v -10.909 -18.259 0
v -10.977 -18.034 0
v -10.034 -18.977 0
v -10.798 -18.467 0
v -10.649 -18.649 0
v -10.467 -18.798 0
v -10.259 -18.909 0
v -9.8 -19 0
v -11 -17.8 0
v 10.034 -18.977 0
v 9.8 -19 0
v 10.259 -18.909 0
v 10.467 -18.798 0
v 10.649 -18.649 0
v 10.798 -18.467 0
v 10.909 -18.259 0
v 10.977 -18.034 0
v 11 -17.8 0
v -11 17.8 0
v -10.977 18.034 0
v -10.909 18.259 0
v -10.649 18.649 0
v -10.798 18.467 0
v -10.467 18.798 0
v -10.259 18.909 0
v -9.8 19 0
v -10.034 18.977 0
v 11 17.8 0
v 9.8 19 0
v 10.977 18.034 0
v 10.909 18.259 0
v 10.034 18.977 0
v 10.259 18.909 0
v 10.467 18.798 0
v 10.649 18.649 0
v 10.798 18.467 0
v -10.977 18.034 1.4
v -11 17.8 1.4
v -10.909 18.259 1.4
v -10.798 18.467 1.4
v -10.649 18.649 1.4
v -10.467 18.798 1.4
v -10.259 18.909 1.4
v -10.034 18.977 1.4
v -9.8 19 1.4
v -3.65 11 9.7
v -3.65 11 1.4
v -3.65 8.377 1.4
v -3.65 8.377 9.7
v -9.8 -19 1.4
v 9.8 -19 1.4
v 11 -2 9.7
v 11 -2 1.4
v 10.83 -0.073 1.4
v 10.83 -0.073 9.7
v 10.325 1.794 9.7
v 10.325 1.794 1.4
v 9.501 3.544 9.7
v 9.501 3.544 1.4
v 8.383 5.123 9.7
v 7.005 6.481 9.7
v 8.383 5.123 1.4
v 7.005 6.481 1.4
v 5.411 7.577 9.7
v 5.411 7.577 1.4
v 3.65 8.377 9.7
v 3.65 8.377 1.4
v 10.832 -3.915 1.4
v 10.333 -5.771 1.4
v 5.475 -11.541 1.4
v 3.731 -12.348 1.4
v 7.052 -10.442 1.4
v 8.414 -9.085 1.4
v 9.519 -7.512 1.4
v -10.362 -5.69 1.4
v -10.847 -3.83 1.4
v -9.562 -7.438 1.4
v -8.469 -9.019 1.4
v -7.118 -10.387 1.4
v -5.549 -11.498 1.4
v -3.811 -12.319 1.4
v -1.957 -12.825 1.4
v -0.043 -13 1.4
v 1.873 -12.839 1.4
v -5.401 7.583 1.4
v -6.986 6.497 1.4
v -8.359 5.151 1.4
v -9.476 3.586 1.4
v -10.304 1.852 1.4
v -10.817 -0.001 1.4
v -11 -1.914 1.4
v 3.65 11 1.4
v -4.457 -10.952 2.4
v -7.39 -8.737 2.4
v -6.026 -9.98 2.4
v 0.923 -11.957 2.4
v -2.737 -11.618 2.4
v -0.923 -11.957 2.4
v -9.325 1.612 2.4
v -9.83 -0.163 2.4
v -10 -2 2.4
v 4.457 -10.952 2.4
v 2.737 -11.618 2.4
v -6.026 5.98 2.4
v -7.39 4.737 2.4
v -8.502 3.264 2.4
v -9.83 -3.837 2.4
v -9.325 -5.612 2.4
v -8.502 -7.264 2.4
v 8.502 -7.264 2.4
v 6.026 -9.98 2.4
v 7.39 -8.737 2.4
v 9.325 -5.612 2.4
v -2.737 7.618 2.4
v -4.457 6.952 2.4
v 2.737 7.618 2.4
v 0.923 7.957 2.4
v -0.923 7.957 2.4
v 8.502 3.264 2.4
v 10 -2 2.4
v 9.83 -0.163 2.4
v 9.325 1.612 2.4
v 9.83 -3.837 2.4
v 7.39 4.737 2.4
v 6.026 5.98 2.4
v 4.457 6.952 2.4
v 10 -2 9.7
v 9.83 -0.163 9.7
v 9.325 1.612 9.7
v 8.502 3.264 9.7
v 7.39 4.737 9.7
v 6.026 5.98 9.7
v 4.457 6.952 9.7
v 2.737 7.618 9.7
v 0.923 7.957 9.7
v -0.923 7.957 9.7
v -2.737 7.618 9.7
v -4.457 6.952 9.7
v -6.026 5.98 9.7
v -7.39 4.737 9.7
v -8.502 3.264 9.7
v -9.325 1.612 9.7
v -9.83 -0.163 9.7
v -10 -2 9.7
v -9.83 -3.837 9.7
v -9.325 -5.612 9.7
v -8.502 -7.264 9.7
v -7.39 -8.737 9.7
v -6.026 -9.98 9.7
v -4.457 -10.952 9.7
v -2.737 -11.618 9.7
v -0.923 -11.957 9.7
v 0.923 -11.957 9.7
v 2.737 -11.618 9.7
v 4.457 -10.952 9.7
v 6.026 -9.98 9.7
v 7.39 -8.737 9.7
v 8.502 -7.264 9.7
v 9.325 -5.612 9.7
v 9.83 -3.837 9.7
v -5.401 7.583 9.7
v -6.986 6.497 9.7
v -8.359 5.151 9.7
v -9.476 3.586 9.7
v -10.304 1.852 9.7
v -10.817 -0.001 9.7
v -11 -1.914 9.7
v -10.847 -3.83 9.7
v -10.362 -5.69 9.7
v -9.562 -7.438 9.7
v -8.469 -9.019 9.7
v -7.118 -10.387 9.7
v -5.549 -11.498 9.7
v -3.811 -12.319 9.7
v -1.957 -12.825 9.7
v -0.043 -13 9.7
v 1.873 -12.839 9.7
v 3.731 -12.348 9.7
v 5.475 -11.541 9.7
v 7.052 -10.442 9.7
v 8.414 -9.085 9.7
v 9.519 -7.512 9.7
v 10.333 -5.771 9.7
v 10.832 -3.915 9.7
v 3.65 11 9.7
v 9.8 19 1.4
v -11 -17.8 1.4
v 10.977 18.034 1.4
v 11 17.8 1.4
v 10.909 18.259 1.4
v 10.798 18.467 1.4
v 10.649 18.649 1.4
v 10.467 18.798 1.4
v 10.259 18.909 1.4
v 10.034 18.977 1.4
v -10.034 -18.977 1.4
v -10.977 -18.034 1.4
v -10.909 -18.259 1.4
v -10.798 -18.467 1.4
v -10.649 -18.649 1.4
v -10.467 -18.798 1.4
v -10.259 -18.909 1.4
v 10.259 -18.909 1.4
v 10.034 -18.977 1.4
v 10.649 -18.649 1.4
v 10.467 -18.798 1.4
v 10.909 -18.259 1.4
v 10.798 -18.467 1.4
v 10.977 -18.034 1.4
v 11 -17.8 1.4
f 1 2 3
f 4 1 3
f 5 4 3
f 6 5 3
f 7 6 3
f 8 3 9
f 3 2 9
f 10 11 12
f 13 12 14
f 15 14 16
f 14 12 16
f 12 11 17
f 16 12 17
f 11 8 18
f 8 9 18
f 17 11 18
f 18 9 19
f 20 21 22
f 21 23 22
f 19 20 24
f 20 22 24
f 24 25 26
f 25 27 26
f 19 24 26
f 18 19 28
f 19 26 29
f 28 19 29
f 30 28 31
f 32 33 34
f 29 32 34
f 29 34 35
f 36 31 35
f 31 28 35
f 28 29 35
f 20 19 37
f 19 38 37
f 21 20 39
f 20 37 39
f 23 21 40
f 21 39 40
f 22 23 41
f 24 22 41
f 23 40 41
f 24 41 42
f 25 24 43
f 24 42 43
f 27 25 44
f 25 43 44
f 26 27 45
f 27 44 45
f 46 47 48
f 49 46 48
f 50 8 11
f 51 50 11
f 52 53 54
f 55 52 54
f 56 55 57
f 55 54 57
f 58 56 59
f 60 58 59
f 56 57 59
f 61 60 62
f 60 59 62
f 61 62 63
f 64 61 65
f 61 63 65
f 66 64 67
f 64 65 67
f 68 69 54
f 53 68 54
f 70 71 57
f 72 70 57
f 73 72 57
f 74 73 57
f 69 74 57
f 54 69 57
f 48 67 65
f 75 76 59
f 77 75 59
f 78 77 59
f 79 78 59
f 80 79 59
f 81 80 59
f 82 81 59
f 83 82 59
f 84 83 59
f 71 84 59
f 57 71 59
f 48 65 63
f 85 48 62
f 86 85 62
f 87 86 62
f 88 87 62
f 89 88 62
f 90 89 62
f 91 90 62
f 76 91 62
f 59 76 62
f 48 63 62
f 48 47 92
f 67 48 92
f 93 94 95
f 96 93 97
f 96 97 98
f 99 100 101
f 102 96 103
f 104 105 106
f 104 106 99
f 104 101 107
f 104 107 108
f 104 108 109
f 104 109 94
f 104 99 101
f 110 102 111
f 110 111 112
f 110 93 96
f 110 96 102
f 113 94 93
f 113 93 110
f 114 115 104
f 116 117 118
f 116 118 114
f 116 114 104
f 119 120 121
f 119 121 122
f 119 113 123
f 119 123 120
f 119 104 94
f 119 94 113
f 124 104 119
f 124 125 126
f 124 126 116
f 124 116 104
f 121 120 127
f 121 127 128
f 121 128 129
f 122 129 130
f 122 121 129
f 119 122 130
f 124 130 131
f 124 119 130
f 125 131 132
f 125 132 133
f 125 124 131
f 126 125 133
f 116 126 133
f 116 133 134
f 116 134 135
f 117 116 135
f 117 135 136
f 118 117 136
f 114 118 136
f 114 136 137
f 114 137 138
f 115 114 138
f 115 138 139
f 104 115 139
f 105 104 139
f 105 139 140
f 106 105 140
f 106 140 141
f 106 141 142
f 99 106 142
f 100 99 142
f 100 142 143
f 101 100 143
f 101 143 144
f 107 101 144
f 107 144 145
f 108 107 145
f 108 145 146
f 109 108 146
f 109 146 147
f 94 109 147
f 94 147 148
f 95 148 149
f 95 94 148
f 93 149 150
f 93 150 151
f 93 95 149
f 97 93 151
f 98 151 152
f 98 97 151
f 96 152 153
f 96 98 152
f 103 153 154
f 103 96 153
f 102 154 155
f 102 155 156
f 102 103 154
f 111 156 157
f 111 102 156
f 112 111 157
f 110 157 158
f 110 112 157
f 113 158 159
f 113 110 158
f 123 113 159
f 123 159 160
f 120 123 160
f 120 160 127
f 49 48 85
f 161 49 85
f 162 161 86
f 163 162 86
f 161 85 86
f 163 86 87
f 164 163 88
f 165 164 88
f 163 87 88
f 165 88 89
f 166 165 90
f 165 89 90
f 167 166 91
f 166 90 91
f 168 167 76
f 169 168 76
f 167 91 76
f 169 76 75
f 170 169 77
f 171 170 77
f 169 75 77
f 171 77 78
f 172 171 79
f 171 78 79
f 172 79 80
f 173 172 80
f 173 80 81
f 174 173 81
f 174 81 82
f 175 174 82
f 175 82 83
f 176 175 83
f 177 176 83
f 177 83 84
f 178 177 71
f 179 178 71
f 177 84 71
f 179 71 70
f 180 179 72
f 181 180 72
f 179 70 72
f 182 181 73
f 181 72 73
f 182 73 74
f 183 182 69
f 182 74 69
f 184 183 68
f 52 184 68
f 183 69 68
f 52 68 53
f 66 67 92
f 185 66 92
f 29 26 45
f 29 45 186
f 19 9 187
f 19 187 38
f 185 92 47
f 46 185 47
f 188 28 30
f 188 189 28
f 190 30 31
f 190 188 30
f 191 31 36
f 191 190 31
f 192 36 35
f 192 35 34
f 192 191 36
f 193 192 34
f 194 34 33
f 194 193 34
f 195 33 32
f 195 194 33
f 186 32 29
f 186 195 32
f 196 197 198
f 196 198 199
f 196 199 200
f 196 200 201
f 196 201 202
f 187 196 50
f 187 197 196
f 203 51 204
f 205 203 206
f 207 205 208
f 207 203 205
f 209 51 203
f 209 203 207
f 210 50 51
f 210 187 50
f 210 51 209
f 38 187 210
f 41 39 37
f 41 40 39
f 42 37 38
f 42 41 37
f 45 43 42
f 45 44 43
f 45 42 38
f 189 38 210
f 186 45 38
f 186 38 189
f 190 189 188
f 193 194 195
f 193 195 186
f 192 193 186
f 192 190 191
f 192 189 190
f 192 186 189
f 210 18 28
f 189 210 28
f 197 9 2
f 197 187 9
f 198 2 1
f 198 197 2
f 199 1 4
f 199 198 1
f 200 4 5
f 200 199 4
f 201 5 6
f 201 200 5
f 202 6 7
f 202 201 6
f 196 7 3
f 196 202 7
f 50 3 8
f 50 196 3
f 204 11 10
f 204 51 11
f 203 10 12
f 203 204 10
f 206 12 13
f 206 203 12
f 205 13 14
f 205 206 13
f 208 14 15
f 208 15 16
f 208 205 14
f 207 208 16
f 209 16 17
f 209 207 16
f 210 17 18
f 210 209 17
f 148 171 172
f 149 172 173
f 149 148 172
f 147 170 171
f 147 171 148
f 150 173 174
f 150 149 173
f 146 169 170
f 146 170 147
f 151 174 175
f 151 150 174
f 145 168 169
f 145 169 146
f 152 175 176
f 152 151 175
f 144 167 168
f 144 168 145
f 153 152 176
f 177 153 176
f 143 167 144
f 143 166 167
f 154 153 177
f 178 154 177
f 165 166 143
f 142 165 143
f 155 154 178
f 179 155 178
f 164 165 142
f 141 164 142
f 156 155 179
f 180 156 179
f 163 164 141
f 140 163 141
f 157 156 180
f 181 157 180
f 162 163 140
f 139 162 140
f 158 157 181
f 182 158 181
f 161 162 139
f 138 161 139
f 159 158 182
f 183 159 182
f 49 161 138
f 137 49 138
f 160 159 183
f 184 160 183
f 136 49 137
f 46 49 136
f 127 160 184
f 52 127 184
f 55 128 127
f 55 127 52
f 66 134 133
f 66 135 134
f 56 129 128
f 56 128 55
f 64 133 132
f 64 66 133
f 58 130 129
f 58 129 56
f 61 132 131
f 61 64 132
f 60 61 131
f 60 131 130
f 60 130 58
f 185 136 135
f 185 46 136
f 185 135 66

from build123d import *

# Parameters (mm, degrees)
F0_W     = 22
F0_H     = 38
F1_DEPTH = 1.4
F2_R     = 1.2
F3_R     = 10
F4_DEPTH = 8.3
F5_DEPTH = 1


with BuildPart() as f1:
    # F0 (on Top) → F1 (new body)
    with BuildSketch(Plane.XY):
        Rectangle(F0_W, F0_H)
    extrude(amount=F1_DEPTH)

    # F2
    f2_edges = [f1.edges().sort_by_distance(p)[0] for p in [
        (-11, 19, 0.7),
        (11, 19, 0.7),
        (-11, -19, 0.7),
        (11, -19, 0.7),
    ]]
    fillet(f2_edges, radius=F2_R)


with BuildPart() as f4:
    # F3 (on face) → F4 (new body)
    with BuildSketch(Plane.XY.offset(1.4)):
        with BuildLine():
            ThreePointArc((-3.65, 8.3767769563), (-6.3580657436, -10.976357836), (11, -2))
            ThreePointArc((11, -2), (8.976357836, 4.3580657436), (3.65, 8.3767769563))
            Line((3.65, 8.3767769563), (-3.65, 8.3767769563))
        make_face()
        with Locations((0, -2)):
            Circle(F3_R, mode=Mode.SUBTRACT)
        with BuildLine():
            Line((-3.65, 8.3767769563), (3.65, 8.3767769563))
            ThreePointArc((3.65, 8.3767769563), (0, 9), (-3.65, 8.3767769563))
        make_face()
        with BuildLine():
            ThreePointArc((-3.65, 8.3767769563), (0, 9), (3.65, 8.3767769563))
            Line((3.65, 8.3767769563), (3.65, 11))
            Line((3.65, 11), (-3.65, 11))
            Line((-3.65, 11), (-3.65, 8.3767769563))
        make_face()
    extrude(amount=F4_DEPTH)

    # F3 (on face) → F5 (join)
    with BuildSketch(Plane.XY.offset(1.4)):
        with Locations((0, -2)):
            Circle(F3_R)
    extrude(amount=F5_DEPTH)


solid = Compound([f1.part, f4.part])
